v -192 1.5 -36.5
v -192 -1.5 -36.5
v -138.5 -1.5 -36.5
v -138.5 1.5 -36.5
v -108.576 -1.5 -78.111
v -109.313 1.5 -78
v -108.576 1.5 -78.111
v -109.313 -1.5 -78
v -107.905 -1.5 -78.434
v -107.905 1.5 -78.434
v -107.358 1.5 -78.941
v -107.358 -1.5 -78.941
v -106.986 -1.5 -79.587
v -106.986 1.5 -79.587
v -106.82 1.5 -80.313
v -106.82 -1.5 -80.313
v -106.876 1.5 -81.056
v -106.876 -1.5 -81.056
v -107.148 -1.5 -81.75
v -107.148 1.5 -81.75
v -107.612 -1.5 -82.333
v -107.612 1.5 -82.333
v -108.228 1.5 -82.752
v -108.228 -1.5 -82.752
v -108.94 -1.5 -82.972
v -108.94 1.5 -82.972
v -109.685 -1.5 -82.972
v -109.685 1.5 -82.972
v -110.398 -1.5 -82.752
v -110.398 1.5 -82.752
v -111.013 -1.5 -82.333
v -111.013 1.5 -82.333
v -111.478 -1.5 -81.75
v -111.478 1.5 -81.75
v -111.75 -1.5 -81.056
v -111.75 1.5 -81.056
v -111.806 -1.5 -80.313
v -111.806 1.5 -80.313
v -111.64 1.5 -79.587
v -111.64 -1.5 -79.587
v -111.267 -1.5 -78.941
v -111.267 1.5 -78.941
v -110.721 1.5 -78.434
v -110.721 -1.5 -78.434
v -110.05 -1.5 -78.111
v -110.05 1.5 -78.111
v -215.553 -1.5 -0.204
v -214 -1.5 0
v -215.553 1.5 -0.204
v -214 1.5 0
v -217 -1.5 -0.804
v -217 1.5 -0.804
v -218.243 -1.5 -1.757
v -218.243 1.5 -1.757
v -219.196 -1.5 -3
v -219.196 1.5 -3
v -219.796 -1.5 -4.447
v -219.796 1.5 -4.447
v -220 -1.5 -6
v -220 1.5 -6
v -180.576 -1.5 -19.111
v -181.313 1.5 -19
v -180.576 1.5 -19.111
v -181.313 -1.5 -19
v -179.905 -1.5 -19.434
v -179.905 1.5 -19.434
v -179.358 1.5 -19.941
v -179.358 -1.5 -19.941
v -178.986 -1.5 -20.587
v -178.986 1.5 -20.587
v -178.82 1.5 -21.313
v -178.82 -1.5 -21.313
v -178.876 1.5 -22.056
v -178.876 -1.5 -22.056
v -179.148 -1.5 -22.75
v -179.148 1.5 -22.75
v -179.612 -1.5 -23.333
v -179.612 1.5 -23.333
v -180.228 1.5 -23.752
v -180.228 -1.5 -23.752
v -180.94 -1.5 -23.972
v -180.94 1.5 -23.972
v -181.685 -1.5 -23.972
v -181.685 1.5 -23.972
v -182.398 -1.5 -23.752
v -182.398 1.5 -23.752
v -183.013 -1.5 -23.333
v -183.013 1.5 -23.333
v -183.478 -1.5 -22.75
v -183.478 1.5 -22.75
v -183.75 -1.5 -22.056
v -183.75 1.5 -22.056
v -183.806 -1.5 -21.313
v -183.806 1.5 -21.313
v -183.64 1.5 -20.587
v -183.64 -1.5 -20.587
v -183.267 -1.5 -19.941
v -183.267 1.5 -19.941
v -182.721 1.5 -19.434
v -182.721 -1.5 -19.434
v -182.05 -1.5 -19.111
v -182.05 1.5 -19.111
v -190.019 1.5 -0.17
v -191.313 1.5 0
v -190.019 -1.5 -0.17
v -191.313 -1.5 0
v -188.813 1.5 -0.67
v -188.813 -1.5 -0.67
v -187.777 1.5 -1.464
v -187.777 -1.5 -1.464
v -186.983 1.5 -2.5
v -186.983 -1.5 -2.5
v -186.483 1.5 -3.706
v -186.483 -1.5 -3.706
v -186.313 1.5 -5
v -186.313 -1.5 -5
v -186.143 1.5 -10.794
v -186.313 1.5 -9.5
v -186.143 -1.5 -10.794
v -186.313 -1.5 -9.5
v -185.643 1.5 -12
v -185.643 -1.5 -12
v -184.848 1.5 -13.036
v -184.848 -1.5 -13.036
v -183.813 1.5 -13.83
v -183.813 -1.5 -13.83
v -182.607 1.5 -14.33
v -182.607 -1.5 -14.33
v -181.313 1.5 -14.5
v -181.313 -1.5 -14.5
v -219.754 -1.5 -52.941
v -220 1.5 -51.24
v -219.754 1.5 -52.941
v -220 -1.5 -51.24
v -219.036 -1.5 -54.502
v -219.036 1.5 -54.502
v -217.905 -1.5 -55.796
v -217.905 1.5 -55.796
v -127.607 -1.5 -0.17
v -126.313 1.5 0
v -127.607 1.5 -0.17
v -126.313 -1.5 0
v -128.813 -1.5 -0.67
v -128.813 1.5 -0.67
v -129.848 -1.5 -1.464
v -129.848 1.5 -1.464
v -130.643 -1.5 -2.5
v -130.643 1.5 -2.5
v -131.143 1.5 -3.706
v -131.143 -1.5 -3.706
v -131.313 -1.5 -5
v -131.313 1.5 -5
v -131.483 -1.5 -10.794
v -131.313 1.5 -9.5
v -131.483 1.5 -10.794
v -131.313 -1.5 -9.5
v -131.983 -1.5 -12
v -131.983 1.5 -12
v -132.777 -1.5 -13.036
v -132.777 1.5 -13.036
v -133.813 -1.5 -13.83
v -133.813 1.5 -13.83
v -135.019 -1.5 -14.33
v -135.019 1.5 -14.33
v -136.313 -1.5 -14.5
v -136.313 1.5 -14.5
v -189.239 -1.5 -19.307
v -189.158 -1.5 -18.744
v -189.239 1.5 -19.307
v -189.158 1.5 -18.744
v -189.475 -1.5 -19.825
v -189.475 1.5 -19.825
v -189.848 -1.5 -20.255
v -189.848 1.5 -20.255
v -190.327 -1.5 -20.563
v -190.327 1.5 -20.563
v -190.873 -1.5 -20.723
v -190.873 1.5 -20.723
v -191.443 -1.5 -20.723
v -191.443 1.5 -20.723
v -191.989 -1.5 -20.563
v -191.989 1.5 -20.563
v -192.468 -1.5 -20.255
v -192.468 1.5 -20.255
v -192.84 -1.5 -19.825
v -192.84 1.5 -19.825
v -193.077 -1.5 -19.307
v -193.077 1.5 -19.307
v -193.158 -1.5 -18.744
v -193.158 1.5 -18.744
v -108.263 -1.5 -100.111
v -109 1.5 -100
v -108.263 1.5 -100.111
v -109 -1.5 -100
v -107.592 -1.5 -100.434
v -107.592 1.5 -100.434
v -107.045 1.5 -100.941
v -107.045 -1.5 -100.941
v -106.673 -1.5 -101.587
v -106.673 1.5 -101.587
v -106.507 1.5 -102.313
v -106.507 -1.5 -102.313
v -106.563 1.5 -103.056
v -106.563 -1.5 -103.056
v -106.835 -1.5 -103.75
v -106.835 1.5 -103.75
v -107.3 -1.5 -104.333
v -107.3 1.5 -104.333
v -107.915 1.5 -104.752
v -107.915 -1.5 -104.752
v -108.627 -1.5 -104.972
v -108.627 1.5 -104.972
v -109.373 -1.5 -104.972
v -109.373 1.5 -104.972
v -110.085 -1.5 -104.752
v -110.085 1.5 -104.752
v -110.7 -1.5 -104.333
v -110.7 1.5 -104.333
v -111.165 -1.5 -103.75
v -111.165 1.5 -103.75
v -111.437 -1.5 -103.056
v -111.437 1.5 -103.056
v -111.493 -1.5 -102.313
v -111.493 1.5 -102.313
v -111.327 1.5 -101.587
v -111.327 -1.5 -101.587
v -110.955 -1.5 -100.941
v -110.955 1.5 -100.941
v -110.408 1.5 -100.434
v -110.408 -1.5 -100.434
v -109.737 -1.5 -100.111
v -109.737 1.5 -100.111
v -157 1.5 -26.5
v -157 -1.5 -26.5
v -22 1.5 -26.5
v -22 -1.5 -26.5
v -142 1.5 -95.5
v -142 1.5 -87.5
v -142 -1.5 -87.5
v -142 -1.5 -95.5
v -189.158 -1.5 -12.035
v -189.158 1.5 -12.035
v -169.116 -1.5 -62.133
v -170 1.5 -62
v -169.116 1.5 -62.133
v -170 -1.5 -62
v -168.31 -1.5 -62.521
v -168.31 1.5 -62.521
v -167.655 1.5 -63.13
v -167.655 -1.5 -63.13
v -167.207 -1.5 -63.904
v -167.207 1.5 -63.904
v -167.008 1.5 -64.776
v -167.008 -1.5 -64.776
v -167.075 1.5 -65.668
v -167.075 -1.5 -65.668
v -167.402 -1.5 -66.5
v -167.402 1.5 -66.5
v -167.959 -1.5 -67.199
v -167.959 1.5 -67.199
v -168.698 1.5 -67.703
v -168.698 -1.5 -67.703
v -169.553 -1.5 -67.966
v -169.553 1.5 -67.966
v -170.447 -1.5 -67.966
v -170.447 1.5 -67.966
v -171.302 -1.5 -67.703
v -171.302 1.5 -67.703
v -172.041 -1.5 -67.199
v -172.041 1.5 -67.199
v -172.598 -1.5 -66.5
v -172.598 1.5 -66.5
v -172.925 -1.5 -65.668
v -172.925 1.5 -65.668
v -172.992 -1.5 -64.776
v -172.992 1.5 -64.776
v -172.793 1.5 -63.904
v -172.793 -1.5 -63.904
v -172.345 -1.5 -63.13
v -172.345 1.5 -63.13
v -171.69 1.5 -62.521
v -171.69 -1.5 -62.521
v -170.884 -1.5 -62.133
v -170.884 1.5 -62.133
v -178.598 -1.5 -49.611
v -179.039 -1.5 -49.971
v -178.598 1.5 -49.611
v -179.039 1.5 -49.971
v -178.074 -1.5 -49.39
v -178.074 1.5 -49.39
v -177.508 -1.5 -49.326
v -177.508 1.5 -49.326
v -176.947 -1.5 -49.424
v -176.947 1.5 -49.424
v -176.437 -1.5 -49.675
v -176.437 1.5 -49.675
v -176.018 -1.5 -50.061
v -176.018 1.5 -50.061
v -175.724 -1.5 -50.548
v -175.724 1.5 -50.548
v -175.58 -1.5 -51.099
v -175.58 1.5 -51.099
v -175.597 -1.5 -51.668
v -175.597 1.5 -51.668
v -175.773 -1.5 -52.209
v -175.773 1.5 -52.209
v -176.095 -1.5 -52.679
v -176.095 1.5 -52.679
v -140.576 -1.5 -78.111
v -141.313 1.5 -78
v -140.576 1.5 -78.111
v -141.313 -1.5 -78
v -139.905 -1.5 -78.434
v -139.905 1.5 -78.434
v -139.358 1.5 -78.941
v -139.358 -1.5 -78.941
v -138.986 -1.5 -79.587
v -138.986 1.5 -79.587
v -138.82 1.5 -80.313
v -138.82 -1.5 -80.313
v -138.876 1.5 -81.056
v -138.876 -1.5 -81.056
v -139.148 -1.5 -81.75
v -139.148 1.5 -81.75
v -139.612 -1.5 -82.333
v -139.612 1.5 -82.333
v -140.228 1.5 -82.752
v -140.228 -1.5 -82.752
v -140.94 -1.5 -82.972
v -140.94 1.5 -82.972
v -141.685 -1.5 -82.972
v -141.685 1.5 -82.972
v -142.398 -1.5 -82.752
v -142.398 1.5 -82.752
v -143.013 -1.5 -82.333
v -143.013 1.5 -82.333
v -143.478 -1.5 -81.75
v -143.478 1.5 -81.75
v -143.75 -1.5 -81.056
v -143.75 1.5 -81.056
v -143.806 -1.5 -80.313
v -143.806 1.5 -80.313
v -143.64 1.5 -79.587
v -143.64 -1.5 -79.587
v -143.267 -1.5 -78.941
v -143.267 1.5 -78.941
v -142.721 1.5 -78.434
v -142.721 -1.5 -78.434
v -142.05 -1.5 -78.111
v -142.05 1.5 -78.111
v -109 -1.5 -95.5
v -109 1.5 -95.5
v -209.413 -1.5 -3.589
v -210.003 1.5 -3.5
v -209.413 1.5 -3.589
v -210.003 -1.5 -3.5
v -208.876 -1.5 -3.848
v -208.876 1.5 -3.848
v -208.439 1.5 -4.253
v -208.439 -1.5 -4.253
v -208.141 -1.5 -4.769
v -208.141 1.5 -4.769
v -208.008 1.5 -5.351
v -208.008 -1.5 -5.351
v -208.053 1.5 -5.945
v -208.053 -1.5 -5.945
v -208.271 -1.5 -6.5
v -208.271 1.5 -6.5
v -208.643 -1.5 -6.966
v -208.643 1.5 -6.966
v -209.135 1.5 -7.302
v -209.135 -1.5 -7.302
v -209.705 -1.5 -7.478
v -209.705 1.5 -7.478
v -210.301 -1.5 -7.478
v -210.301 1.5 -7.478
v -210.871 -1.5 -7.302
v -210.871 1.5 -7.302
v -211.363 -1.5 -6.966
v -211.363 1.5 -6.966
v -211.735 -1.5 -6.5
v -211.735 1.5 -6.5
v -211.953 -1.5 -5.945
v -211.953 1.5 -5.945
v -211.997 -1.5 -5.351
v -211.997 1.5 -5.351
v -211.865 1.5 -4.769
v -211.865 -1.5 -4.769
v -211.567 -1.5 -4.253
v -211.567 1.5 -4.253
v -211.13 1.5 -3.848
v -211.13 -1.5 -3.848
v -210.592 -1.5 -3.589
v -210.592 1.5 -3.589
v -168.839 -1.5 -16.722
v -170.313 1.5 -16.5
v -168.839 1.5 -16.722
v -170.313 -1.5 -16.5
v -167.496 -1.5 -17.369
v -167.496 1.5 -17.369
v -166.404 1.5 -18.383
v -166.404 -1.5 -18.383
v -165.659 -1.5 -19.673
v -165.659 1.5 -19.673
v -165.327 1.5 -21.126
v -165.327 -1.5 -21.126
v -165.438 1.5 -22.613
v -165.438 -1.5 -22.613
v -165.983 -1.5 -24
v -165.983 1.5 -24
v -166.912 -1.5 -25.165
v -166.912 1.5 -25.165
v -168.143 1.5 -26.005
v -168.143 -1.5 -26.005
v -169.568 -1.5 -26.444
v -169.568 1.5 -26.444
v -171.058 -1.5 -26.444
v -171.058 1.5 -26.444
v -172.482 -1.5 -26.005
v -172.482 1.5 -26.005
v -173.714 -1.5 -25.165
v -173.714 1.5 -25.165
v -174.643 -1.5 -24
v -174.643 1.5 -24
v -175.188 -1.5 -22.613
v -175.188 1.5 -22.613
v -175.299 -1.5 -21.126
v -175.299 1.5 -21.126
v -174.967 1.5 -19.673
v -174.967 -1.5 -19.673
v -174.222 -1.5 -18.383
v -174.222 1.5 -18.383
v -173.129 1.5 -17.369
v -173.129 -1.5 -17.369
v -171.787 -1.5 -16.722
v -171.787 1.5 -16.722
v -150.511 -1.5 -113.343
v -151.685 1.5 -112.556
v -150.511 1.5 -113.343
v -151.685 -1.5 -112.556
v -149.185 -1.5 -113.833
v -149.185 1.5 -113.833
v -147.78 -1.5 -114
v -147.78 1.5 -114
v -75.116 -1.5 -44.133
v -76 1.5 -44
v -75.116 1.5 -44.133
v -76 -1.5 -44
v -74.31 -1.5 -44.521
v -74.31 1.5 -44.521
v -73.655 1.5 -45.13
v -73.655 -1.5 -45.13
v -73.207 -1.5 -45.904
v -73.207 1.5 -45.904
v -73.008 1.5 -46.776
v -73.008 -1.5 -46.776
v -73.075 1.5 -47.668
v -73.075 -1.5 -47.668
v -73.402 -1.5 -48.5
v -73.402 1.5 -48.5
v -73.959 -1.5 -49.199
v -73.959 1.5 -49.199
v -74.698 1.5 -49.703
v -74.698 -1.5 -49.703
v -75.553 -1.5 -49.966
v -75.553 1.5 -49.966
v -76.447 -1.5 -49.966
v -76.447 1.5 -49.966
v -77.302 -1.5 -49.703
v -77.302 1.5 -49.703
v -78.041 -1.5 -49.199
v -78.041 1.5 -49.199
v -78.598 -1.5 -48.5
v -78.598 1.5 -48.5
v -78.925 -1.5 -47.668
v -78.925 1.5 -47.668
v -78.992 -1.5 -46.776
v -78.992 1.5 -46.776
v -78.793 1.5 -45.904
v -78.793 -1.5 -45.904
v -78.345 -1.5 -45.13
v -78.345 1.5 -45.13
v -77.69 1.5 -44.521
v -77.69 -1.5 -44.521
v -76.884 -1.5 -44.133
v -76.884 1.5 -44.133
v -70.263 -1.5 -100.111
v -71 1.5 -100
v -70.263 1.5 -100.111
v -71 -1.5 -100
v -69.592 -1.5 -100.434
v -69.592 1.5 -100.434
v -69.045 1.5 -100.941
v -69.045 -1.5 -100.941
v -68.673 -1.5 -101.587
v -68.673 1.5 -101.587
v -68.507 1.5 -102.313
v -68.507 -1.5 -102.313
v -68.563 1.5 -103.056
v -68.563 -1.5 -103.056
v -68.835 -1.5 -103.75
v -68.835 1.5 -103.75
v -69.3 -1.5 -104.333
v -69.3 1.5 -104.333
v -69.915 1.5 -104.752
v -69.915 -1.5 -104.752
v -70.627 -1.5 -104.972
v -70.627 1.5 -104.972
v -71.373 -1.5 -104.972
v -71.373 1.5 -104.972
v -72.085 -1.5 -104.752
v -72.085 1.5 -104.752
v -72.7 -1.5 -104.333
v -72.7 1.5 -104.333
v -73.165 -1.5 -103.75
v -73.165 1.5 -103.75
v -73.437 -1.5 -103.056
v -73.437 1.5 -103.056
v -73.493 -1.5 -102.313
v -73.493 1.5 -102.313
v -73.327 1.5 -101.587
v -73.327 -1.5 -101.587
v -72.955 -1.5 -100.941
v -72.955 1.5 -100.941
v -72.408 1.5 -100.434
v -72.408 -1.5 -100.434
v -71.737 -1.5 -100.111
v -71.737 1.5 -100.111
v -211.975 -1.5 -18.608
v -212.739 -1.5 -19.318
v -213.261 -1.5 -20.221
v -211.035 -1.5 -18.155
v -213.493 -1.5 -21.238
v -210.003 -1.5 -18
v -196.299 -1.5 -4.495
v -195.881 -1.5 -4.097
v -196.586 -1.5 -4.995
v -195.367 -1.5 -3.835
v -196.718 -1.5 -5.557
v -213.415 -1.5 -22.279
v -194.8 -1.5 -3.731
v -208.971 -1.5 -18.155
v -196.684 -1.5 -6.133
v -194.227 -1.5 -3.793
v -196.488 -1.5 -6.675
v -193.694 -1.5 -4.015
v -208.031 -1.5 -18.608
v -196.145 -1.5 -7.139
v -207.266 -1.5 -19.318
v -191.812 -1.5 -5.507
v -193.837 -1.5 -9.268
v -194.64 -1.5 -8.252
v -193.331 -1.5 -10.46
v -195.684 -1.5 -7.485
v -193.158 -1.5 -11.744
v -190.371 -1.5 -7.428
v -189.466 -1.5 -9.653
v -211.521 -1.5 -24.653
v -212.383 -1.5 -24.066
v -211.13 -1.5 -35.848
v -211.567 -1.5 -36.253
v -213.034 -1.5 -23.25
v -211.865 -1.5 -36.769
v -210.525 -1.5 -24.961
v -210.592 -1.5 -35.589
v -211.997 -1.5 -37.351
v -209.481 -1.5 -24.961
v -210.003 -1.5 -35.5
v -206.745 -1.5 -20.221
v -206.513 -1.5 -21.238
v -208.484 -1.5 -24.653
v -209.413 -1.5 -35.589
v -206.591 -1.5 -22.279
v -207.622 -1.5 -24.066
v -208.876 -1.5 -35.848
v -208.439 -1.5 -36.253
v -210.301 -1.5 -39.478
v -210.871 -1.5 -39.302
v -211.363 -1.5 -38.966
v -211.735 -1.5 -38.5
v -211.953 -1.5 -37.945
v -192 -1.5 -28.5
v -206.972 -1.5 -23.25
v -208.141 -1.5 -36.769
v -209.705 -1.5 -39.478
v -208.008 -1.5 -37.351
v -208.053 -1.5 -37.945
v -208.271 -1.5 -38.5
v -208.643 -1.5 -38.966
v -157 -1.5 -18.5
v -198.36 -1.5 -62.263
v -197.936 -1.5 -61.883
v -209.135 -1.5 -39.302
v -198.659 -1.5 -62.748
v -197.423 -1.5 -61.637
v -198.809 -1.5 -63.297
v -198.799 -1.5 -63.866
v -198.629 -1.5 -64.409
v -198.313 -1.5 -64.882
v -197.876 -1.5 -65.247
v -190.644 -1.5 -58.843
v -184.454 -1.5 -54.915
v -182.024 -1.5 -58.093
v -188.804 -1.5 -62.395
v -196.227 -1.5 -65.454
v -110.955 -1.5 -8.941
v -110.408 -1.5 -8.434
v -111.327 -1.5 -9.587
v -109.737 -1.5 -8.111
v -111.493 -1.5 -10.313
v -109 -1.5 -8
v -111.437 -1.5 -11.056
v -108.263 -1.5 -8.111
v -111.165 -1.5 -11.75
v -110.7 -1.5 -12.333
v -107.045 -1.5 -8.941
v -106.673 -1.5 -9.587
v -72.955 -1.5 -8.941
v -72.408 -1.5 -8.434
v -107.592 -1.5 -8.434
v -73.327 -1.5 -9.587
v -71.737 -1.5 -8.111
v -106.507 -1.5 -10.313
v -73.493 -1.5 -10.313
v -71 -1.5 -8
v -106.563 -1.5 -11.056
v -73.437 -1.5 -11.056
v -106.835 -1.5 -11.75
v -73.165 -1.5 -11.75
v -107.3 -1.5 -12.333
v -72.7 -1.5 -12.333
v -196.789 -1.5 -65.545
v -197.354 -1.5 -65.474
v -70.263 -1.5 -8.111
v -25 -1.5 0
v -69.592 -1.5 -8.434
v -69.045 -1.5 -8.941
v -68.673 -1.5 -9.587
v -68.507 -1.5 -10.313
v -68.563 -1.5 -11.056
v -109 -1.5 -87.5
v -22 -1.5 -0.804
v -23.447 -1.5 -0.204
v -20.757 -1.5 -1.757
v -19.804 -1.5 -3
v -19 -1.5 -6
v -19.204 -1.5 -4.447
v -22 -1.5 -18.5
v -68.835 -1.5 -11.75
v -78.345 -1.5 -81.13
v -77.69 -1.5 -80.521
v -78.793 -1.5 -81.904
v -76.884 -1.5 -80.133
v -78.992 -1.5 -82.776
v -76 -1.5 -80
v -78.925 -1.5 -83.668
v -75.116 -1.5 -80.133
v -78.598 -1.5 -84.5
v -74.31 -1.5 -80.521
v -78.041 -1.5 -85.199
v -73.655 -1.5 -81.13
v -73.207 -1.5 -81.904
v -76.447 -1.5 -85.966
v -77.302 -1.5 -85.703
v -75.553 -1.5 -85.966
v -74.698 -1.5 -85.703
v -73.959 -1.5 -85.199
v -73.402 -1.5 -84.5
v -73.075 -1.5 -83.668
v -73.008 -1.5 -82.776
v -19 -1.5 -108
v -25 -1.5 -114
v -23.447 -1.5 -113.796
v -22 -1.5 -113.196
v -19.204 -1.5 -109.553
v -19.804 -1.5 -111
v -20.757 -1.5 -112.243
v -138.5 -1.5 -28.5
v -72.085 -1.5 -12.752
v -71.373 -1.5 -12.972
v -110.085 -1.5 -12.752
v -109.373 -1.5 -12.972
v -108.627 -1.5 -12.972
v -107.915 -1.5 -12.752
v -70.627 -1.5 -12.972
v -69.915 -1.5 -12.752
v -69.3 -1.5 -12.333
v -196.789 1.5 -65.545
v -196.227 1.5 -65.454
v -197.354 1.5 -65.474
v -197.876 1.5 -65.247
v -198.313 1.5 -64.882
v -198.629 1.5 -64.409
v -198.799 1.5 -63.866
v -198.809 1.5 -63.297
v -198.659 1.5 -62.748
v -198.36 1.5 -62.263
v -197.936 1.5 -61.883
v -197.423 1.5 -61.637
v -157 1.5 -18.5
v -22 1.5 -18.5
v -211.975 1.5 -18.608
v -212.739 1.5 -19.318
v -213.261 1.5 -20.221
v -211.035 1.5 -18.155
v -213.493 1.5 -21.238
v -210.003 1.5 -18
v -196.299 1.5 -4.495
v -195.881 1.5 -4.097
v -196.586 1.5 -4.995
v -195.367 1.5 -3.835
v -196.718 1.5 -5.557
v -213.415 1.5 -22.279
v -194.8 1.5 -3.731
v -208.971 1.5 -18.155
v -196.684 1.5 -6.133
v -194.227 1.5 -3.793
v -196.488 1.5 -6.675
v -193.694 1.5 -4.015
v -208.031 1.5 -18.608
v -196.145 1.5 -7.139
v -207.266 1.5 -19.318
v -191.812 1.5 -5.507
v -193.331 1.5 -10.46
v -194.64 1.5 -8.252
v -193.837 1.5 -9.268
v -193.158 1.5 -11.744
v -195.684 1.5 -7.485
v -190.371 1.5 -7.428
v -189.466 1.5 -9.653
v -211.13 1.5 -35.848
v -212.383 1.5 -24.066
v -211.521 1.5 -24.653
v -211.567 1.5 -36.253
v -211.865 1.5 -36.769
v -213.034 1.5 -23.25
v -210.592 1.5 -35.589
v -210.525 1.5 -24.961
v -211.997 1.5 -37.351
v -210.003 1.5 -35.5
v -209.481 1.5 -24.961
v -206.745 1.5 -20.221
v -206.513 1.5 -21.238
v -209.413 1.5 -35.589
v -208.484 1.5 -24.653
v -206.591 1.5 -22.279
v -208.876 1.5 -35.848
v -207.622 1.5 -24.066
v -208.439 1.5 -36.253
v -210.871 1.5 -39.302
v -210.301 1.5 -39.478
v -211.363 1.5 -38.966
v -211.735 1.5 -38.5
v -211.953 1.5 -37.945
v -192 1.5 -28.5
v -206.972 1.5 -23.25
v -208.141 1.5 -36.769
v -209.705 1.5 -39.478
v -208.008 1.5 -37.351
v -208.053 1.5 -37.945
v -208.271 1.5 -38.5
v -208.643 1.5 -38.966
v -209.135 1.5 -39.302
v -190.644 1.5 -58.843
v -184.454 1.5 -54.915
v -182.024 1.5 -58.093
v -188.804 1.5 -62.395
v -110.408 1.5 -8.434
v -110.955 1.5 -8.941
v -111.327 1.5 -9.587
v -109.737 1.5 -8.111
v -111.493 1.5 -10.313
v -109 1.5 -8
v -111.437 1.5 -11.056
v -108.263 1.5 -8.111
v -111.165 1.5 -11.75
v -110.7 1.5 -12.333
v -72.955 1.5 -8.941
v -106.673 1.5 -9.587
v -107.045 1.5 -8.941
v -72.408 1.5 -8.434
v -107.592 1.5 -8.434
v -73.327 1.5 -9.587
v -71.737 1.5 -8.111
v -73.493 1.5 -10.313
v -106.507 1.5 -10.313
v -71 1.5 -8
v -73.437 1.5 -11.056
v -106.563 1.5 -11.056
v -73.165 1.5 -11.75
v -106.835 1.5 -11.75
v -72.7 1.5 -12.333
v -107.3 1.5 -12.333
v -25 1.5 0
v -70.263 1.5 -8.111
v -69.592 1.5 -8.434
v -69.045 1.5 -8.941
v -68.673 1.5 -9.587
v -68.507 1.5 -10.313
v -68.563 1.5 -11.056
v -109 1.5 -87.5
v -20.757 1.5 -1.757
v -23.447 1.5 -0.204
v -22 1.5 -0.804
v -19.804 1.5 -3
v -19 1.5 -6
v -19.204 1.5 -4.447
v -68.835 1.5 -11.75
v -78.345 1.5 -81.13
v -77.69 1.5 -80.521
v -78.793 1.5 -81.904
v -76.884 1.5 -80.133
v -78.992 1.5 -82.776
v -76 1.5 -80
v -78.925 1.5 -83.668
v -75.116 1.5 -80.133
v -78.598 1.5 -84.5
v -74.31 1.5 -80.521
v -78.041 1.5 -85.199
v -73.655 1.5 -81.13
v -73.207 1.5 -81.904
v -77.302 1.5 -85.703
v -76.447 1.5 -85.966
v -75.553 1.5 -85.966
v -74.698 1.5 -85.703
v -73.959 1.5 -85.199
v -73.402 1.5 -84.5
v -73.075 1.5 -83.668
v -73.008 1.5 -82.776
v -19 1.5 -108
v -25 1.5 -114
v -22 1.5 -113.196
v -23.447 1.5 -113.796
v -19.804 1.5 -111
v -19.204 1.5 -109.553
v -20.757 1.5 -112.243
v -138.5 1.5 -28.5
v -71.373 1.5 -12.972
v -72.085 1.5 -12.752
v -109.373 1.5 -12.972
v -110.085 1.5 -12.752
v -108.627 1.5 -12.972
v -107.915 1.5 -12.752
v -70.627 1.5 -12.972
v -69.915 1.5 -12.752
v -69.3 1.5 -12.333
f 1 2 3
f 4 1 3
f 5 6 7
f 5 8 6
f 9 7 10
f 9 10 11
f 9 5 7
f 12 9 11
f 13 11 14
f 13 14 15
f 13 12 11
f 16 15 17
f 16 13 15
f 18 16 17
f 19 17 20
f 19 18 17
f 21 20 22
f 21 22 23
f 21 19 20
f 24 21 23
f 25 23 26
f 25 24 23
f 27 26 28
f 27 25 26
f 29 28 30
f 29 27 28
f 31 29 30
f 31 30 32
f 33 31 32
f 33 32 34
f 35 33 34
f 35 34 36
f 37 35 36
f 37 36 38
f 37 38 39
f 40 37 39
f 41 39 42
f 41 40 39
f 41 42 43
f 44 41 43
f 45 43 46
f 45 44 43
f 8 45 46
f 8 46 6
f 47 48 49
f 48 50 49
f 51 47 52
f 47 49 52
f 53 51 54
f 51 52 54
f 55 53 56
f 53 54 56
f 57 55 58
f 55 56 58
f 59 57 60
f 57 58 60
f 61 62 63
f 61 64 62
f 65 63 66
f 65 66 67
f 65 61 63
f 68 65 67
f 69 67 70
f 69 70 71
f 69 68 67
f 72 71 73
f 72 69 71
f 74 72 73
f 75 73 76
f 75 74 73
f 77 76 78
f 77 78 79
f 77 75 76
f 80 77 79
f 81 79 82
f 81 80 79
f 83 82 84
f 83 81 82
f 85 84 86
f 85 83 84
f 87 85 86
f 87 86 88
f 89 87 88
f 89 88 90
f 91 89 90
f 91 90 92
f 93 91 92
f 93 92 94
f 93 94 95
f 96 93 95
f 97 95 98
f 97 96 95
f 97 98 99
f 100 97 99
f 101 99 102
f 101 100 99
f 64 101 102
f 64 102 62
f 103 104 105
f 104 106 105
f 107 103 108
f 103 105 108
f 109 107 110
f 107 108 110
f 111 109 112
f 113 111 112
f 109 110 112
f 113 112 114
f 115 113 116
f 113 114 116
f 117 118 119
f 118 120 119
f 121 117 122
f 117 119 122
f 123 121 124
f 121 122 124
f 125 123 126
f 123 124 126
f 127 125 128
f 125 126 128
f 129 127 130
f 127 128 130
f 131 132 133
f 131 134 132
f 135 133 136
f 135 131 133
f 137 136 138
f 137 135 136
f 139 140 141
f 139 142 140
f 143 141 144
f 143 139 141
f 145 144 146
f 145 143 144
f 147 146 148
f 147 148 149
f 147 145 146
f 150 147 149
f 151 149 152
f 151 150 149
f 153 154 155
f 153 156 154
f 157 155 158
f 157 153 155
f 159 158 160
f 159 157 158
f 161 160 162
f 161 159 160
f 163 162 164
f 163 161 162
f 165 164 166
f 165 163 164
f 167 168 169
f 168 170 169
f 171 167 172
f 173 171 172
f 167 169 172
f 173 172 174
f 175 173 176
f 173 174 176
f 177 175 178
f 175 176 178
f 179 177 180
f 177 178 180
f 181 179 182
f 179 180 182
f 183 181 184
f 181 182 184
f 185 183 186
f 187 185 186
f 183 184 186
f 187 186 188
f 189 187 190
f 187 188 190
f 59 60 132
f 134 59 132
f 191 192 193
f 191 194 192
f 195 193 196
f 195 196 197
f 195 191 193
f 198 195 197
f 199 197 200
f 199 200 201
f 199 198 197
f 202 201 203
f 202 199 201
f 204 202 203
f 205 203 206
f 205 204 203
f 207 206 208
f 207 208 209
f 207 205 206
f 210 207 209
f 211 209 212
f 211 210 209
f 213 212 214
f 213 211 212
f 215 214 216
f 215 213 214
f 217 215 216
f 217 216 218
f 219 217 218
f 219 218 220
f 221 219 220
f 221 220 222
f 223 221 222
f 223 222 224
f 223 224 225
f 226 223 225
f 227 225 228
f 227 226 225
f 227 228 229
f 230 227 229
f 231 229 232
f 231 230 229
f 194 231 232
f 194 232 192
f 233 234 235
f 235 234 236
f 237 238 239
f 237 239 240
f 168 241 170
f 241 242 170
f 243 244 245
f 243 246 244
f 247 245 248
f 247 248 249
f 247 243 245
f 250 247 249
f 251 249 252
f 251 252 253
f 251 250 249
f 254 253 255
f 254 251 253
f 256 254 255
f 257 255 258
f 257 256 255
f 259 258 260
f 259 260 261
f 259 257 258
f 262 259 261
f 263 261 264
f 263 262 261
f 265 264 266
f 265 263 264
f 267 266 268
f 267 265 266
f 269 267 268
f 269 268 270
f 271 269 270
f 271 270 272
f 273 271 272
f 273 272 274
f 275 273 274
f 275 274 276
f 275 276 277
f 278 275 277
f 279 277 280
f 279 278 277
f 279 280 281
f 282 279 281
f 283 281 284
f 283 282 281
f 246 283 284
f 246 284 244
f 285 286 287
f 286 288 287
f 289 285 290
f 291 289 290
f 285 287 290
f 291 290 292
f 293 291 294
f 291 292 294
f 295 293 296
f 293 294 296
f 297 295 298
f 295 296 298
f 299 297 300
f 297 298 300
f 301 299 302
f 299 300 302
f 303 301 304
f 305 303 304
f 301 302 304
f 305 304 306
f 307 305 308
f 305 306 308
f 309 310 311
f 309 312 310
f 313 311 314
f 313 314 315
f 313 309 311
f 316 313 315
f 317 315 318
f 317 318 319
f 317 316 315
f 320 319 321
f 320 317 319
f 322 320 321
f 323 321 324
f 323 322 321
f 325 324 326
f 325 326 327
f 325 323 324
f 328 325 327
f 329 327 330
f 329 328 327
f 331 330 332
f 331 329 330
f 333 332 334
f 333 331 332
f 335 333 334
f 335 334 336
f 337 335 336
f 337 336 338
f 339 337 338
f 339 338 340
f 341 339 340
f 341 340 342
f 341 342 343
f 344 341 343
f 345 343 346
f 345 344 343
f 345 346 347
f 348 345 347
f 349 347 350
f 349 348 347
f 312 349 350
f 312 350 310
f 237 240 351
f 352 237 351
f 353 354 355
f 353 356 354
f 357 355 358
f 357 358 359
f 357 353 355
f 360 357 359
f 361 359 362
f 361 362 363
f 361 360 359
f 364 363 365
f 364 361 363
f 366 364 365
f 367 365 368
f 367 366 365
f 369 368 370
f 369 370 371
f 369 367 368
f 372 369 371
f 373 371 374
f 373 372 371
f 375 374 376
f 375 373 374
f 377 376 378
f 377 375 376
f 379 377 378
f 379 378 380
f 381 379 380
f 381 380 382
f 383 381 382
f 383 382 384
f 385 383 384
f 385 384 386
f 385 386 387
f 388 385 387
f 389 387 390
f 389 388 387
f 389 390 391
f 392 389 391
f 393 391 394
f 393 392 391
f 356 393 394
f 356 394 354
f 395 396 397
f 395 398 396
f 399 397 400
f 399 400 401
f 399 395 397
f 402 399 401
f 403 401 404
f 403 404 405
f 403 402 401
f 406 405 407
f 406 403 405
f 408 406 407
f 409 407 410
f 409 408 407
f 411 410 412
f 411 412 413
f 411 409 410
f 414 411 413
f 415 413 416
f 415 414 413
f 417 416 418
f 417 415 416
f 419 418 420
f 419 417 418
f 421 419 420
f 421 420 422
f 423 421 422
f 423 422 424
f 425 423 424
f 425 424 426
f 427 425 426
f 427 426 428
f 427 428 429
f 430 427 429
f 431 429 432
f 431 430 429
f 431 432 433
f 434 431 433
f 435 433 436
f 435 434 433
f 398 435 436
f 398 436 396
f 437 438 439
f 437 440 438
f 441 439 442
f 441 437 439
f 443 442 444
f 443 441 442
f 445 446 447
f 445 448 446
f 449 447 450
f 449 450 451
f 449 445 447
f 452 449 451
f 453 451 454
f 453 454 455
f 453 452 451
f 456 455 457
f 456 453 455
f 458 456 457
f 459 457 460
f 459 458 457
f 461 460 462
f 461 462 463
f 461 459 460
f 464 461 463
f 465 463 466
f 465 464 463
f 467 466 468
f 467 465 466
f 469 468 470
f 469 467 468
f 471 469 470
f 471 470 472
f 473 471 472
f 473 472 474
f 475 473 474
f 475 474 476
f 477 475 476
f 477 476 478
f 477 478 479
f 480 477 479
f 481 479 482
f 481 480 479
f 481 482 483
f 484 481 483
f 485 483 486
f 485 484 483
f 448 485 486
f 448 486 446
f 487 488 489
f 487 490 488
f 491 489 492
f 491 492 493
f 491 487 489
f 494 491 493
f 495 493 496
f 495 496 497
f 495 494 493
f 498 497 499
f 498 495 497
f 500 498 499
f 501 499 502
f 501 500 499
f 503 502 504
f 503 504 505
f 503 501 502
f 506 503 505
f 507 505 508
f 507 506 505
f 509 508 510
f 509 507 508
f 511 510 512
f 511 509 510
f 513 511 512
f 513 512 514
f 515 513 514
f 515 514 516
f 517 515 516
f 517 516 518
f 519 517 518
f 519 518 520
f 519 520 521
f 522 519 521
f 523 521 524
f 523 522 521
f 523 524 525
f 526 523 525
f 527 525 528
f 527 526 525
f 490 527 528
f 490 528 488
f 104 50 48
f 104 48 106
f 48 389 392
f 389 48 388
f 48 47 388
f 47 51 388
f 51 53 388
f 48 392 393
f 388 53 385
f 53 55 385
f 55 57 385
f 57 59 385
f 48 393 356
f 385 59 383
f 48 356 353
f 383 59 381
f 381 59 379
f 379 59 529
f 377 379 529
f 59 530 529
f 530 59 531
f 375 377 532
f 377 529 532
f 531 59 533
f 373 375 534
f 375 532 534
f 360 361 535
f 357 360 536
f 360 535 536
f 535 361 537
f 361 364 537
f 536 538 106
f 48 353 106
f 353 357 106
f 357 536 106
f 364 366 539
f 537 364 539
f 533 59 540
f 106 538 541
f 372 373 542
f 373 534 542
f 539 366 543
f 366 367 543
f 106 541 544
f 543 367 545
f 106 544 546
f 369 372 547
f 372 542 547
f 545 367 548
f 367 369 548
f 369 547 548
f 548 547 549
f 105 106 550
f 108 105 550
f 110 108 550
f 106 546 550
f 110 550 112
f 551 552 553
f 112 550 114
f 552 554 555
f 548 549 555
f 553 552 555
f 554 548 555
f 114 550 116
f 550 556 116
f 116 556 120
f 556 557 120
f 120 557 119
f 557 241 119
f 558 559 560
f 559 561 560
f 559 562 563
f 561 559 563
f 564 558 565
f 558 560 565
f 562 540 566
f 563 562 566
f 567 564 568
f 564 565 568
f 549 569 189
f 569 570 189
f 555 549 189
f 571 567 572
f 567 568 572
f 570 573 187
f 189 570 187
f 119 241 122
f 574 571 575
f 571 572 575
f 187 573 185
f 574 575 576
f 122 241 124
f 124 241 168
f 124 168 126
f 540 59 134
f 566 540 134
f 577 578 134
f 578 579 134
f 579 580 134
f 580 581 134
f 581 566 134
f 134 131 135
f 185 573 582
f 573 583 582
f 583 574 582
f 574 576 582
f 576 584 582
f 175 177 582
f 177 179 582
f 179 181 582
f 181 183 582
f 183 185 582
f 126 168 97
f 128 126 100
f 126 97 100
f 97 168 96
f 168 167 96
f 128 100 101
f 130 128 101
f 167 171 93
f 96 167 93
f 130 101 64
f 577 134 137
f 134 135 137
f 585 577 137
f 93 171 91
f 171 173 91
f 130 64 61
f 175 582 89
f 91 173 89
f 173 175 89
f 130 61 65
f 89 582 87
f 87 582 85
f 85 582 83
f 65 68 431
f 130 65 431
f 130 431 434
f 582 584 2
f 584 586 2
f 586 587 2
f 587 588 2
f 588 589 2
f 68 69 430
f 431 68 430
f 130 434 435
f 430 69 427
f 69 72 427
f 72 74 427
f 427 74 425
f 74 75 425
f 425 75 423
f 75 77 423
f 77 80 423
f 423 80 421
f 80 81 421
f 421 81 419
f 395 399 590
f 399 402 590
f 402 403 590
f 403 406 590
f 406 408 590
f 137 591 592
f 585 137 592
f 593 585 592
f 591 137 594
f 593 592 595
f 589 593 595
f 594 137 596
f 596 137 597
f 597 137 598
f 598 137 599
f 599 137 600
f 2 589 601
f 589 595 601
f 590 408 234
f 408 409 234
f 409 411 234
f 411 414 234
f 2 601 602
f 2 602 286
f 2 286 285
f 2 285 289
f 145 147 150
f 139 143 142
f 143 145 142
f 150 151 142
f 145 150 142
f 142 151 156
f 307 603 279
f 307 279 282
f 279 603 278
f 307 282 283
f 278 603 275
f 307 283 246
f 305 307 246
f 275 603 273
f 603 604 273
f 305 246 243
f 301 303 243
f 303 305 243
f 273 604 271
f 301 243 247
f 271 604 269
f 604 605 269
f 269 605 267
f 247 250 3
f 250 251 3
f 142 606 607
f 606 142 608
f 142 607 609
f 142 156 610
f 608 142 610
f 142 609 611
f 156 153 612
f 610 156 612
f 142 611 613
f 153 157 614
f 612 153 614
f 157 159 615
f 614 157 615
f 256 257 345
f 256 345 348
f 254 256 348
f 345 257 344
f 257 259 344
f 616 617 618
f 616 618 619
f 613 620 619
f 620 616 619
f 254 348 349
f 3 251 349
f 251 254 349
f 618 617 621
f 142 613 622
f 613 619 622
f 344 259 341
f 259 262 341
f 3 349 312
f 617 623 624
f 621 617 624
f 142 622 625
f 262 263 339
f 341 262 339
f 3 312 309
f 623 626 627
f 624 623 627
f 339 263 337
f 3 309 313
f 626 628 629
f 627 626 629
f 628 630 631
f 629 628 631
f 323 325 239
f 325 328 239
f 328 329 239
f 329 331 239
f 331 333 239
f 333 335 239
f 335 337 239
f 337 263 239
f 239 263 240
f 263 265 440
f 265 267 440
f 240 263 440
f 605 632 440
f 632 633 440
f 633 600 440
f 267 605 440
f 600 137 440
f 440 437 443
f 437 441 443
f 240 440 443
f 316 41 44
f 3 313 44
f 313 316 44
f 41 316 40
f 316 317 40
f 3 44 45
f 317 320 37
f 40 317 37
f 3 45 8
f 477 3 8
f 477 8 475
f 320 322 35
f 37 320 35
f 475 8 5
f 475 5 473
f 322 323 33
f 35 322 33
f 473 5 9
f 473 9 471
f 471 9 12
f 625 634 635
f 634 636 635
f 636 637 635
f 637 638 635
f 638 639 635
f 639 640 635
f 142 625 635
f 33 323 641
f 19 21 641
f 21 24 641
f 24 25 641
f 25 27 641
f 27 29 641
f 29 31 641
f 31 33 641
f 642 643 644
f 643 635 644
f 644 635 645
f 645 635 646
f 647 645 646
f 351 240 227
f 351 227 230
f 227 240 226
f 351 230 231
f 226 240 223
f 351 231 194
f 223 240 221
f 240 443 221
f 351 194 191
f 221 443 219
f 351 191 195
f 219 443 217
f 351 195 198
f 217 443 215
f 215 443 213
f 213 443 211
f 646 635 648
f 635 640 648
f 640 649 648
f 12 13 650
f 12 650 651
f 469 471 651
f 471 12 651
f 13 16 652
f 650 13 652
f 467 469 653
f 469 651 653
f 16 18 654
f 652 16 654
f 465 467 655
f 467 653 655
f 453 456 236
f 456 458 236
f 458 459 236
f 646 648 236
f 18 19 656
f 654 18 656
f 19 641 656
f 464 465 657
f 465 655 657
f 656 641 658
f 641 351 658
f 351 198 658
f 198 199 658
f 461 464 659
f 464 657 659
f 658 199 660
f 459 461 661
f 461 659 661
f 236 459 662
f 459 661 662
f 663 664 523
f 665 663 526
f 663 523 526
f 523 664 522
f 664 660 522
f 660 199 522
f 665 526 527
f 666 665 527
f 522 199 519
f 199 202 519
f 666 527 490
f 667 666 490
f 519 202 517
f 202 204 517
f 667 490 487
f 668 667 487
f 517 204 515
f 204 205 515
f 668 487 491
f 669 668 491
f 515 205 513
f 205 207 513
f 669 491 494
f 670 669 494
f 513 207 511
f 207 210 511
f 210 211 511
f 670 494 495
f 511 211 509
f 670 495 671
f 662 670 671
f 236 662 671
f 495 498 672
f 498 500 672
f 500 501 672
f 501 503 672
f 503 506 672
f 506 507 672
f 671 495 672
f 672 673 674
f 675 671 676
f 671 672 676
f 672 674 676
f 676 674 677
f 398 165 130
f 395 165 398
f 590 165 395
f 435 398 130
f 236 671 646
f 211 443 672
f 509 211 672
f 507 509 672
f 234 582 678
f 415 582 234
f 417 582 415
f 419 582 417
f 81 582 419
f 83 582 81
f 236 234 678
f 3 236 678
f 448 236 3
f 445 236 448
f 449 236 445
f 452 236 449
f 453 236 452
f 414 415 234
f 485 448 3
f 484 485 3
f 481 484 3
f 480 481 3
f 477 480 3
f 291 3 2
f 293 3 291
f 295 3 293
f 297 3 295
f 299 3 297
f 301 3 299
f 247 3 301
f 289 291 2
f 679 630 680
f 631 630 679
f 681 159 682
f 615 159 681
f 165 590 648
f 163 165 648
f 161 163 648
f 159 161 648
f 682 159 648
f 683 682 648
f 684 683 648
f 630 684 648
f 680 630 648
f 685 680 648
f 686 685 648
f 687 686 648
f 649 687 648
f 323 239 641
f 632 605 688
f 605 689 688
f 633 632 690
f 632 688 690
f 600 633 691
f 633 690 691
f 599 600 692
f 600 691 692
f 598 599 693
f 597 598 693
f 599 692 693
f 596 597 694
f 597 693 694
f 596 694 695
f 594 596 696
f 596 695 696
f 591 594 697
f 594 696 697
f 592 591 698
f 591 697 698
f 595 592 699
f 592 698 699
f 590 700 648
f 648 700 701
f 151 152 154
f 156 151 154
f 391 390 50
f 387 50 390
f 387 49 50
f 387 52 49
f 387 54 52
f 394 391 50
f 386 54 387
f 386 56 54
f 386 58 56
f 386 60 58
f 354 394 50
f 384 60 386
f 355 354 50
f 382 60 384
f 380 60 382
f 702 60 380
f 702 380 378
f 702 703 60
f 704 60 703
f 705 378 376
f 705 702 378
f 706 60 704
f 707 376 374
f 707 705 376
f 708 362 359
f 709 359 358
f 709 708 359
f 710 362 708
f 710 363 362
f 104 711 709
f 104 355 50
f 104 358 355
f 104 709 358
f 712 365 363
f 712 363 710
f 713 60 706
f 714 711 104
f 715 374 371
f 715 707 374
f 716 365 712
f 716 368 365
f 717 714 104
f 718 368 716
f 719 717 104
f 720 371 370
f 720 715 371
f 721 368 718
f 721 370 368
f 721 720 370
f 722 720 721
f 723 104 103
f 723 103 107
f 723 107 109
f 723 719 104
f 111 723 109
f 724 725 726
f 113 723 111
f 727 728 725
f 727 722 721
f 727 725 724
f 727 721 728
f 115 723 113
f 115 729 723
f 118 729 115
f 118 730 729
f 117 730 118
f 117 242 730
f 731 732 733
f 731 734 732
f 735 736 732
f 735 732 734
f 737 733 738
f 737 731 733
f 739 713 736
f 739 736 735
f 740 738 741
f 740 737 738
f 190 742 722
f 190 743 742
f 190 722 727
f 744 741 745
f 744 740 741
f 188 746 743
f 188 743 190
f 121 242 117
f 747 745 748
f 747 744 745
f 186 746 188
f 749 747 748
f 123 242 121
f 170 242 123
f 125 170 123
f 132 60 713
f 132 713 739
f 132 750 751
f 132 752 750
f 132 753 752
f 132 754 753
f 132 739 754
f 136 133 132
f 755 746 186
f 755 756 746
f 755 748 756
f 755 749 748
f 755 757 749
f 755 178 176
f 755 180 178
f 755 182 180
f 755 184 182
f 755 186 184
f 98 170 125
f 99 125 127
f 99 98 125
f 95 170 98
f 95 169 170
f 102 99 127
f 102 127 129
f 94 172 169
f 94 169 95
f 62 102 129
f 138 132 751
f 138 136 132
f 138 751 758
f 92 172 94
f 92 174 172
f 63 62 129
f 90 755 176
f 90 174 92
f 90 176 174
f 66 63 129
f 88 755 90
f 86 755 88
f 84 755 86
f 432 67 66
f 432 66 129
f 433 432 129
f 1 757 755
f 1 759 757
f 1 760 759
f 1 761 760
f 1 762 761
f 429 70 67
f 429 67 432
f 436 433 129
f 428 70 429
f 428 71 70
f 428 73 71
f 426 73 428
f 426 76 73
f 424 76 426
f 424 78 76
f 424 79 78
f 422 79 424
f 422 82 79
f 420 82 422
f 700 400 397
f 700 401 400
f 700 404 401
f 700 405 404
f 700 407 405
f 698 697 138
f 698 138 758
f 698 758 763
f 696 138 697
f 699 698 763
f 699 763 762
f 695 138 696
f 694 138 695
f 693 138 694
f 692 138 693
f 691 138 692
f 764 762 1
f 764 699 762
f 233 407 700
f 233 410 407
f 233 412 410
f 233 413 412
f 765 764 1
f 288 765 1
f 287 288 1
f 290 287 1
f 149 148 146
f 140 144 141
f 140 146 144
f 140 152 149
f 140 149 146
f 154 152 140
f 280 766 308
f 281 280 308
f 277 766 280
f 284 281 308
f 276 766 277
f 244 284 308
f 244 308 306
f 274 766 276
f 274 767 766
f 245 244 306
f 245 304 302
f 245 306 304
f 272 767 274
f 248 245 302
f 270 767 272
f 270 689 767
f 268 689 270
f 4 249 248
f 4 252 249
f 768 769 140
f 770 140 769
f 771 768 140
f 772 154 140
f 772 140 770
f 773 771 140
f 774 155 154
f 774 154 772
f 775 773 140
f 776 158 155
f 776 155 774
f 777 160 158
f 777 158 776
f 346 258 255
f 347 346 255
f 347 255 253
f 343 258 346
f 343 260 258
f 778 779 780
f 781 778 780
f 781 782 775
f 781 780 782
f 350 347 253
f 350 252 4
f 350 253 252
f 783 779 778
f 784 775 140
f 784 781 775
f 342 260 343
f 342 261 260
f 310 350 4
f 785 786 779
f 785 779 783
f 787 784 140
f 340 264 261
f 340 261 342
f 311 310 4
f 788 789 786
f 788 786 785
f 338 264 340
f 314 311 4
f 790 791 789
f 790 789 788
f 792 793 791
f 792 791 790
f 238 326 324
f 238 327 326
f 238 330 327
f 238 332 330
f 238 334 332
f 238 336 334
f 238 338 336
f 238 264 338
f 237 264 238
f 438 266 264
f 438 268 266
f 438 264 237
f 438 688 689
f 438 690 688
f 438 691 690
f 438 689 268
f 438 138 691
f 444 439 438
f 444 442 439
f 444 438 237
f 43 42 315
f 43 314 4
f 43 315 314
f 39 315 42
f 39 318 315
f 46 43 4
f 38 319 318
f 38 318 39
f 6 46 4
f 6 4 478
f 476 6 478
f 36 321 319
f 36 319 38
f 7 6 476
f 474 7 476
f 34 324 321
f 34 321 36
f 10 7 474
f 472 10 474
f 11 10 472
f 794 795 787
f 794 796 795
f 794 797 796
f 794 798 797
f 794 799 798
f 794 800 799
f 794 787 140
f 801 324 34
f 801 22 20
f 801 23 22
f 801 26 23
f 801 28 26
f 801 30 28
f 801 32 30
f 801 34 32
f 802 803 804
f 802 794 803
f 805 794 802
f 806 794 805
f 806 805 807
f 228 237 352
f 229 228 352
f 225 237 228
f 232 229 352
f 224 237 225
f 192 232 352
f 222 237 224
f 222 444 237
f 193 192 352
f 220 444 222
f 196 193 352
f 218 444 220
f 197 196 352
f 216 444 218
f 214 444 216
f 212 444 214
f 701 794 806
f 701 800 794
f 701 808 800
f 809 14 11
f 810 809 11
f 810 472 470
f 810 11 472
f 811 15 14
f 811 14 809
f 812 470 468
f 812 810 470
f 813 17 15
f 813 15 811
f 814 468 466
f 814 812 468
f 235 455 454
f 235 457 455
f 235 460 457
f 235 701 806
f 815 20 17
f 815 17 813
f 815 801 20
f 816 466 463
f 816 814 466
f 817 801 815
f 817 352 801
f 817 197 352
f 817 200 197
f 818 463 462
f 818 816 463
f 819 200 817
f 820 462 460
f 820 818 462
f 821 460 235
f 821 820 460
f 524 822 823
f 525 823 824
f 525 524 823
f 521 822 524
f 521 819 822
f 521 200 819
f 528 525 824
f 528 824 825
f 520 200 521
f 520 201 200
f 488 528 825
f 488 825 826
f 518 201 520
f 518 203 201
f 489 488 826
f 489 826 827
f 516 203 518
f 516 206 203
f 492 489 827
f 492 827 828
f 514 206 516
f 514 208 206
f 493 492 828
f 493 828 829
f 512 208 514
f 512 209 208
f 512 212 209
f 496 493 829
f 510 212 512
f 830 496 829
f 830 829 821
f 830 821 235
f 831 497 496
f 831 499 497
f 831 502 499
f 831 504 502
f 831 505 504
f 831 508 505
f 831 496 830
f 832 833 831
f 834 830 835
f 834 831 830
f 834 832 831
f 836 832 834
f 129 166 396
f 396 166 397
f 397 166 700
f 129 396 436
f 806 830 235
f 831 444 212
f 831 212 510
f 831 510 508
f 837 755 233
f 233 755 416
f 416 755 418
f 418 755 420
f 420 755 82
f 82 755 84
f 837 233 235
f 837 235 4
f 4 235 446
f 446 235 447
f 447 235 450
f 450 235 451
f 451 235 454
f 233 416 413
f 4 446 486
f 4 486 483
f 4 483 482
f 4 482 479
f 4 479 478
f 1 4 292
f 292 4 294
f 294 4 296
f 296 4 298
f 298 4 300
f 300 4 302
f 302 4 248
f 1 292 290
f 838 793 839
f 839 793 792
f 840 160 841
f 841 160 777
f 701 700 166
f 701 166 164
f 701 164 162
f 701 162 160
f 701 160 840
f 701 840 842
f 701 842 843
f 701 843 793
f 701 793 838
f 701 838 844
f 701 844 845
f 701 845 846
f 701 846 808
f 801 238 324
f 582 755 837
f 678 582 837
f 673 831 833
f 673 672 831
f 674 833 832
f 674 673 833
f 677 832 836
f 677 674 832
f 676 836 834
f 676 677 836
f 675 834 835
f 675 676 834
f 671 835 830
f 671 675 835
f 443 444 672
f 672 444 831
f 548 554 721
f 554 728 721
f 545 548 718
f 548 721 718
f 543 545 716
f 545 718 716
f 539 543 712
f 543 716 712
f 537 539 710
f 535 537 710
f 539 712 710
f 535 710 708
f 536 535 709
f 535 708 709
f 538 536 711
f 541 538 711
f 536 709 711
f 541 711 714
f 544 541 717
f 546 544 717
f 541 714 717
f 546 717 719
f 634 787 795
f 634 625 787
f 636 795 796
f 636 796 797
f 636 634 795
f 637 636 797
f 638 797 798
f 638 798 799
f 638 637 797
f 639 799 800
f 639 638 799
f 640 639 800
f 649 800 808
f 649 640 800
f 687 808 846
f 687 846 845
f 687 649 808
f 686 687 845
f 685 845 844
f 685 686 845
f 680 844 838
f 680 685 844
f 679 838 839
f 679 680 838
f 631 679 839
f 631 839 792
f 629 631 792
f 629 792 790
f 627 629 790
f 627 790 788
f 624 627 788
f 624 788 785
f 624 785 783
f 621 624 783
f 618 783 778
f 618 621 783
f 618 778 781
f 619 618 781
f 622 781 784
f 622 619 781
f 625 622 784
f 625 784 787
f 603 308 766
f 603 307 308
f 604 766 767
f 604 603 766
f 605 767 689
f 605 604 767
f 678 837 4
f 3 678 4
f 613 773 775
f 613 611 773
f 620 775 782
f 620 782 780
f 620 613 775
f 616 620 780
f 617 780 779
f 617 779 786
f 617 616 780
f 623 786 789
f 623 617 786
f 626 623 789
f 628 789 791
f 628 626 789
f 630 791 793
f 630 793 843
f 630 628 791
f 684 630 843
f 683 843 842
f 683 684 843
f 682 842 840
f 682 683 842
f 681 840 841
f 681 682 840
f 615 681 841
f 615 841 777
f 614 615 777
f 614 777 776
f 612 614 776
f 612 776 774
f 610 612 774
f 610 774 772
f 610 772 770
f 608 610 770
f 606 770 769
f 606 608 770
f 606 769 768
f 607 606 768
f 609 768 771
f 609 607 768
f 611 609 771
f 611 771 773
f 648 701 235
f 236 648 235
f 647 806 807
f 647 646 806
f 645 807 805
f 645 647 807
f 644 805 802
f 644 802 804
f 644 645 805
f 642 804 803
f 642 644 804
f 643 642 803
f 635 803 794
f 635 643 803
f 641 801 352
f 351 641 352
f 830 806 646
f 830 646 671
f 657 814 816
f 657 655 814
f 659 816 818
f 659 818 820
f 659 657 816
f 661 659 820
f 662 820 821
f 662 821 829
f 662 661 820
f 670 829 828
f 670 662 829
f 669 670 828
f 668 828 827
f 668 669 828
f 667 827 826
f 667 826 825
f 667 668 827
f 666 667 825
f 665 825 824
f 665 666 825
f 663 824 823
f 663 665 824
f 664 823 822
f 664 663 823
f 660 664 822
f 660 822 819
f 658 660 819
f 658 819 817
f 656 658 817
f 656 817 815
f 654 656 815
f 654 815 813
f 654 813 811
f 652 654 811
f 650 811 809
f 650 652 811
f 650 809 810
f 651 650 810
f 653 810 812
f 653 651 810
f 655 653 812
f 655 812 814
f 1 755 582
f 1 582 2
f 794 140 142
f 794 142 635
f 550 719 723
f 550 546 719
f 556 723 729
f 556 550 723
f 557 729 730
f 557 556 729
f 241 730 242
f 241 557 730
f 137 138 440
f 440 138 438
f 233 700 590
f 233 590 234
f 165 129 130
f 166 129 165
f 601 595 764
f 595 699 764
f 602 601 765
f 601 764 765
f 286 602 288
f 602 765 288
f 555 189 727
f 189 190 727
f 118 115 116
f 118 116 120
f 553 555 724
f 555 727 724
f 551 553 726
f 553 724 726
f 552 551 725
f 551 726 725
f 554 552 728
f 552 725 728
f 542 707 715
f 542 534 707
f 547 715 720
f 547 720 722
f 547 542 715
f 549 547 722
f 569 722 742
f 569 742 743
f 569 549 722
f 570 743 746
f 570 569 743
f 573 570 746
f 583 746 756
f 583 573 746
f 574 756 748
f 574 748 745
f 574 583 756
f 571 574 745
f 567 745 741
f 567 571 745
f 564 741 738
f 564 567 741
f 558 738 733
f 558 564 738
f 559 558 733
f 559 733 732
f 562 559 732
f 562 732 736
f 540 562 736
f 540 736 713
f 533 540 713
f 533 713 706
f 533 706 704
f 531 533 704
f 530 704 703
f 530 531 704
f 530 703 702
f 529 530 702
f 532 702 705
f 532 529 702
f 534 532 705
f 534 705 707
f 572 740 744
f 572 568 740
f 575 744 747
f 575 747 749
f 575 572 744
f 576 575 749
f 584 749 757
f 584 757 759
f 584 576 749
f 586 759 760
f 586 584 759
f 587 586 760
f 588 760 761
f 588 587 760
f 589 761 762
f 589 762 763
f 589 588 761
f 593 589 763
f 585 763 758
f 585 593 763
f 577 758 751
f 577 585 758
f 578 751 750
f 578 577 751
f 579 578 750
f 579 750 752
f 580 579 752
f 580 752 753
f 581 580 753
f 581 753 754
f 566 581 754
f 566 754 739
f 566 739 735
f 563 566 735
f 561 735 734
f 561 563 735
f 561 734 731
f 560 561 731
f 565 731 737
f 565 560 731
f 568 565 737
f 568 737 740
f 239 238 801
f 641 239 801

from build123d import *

# Parameters (mm, degrees)
SKETCH_1_W          = 220
SKETCH_1_H          = 114
SKETCH_1_R          = 2.5
SKETCH_1_R_2        = 3
SKETCH_1_R_3        = 5
SKETCH_1_R_4        = 2
SKETCH_1_R_5        = 3.5
SKETCH_1_W_2        = 135
SKETCH_1_H_2        = 8
SKETCH_1_W_3        = 53.5
SKETCH_1_W_4        = 33
EXTRUDE_1_DEPTH     = 1.5
SKETCH_2_W          = 55
SKETCH_2_H          = 14.5
CUT_EXTRUDE_1_DEPTH = 248.800322841
FILLET_1_R          = 5
SKETCH_3_W          = 19
SKETCH_3_H          = 114
CUT_EXTRUDE_2_DEPTH = 248.800322841
FILLET_2_R          = 6


with BuildPart() as part:
    # 草图1 → 凸台-拉伸1 (new, symmetric)
    with BuildSketch(Plane(origin=(0, 0, 0), x_dir=(1, 0, 0), z_dir=(0, 1, 0))):
        with Locations((-110, 57)):
            Rectangle(SKETCH_1_W, SKETCH_1_H)
        with Locations(Location((-71, 102.5, 0), (0, 0, 270))):
            Circle(SKETCH_1_R, mode=Mode.SUBTRACT)
        with Locations(Location((-109, 102.5, 0), (0, 0, 270))):
            Circle(SKETCH_1_R, mode=Mode.SUBTRACT)
        with Locations(Location((-141.312887166, 80.5, 0), (0, 0, 270))):
            Circle(SKETCH_1_R, mode=Mode.SUBTRACT)
        with Locations(Location((-109.312887166, 80.5, 0), (0, 0, 270))):
            Circle(SKETCH_1_R, mode=Mode.SUBTRACT)
        with Locations(Location((-109, 10.5, 0), (0, 0, 270))):
            Circle(SKETCH_1_R, mode=Mode.SUBTRACT)
        with Locations(Location((-71, 10.5, 0), (0, 0, 270))):
            Circle(SKETCH_1_R, mode=Mode.SUBTRACT)
        with Locations(Location((-76, 47, 0), (0, 0, 270))):
            Circle(SKETCH_1_R_2, mode=Mode.SUBTRACT)
        with Locations(Location((-76, 83, 0), (0, 0, 270))):
            Circle(SKETCH_1_R_2, mode=Mode.SUBTRACT)
        with Locations(Location((-170, 65, 0), (0, 0, 270))):
            Circle(SKETCH_1_R_2, mode=Mode.SUBTRACT)
        with Locations(Location((-170.312887166, 21.5, 0), (0, 0, 270))):
            Circle(SKETCH_1_R_3, mode=Mode.SUBTRACT)
        with Locations(Location((-181.312887166, 21.5, 0), (0, 0, 270))):
            Circle(SKETCH_1_R, mode=Mode.SUBTRACT)
        with Locations(Location((-210.002887166, 37.50000026, 0), (0, 0, 270))):
            Circle(SKETCH_1_R_4, mode=Mode.SUBTRACT)
        with Locations(Location((-210.002887166, 5.5, 0), (0, 0, 270))):
            Circle(SKETCH_1_R_4, mode=Mode.SUBTRACT)
        with Locations(Location((-210.002887166, 21.5, 0), (0, 0, 270))):
            Circle(SKETCH_1_R_5, mode=Mode.SUBTRACT)
        with BuildLine():
            Line((-193.157887166, 18.743662964), (-193.157887166, 11.743662964))
            ThreePointArc((-193.157887166, 11.743662964), (-193.836926328, 9.268099132), (-195.683983559, 7.485435381))
            ThreePointArc((-195.683983559, 7.485435381), (-196.460455274, 4.734904062), (-193.694496162, 4.015320115))
            ThreePointArc((-193.694496162, 4.015320115), (-190.370630742, 7.428094707), (-189.157887166, 12.035085564))
            Line((-189.157887166, 12.035085564), (-189.157887166, 18.743662964))
            ThreePointArc((-189.157887166, 18.743662964), (-191.157887166, 20.743662964), (-193.157887166, 18.743662964))
        make_face(mode=Mode.SUBTRACT)
        with Locations((-89.5, 22.5)):
            Rectangle(SKETCH_1_W_2, SKETCH_1_H_2, mode=Mode.SUBTRACT)
        with Locations((-165.25, 32.5)):
            Rectangle(SKETCH_1_W_3, SKETCH_1_H_2, mode=Mode.SUBTRACT)
        with Locations((-125.5, 91.5)):
            Rectangle(SKETCH_1_W_4, SKETCH_1_H_2, mode=Mode.SUBTRACT)
        with BuildLine():
            ThreePointArc((-196.226976492, 65.454109411), (-198.733501828, 64.143639747), (-197.423032164, 61.637114411))
            ThreePointArc((-197.423032164, 61.637114411), (-187.463332326, 57.014316596), (-179.039469146, 49.971276796))
            ThreePointArc((-179.039469146, 49.971276796), (-176.213519698, 49.852914148), (-176.09515705, 52.678863596))
            ThreePointArc((-176.09515705, 52.678863596), (-185.320120262, 60.391688659), (-196.226976492, 65.454109411))
        make_face(mode=Mode.SUBTRACT)
    extrude(amount=EXTRUDE_1_DEPTH, both=True)

    # 草图2 → 切除-拉伸1 (cut, through all)
    with BuildSketch(Plane(origin=(0, 1.5, 0), x_dir=(1, 0, 0), z_dir=(0, 1, 0))):
        with Locations((-158.812887166, 7.25)):
            Rectangle(SKETCH_2_W, SKETCH_2_H)
    extrude(amount=-CUT_EXTRUDE_1_DEPTH, mode=Mode.SUBTRACT)

    # 圆角1
    fillet_1_edges = [part.edges().sort_by_distance(p)[0] for p in [
        (-186.312887166, 0, 0),
        (-186.312887166, 0, -14.5),
        (-131.312887166, 0, -14.5),
        (-131.312887166, 0, 0),
    ]]
    fillet(fillet_1_edges, radius=FILLET_1_R)

    # 草图3 → 切除-拉伸2 (cut, through all)
    with BuildSketch(Plane(origin=(0, 1.5, 0), x_dir=(1, 0, 0), z_dir=(0, 1, 0))):
        Polygon((-220, 54), (-150, 114), (-220, 114), align=None)
        with Locations((-9.5, 57)):
            Rectangle(SKETCH_3_W, SKETCH_3_H)
    extrude(amount=-CUT_EXTRUDE_2_DEPTH, mode=Mode.SUBTRACT)

    # 圆角2
    fillet_2_edges = [part.edges().sort_by_distance(p)[0] for p in [
        (-220, 0, -54),
        (-150, 0, -114),
        (-19, 0, 0),
        (-19, 0, -114),
        (-220, 0, 0),
    ]]
    fillet(fillet_2_edges, radius=FILLET_2_R)


solid = part.part
